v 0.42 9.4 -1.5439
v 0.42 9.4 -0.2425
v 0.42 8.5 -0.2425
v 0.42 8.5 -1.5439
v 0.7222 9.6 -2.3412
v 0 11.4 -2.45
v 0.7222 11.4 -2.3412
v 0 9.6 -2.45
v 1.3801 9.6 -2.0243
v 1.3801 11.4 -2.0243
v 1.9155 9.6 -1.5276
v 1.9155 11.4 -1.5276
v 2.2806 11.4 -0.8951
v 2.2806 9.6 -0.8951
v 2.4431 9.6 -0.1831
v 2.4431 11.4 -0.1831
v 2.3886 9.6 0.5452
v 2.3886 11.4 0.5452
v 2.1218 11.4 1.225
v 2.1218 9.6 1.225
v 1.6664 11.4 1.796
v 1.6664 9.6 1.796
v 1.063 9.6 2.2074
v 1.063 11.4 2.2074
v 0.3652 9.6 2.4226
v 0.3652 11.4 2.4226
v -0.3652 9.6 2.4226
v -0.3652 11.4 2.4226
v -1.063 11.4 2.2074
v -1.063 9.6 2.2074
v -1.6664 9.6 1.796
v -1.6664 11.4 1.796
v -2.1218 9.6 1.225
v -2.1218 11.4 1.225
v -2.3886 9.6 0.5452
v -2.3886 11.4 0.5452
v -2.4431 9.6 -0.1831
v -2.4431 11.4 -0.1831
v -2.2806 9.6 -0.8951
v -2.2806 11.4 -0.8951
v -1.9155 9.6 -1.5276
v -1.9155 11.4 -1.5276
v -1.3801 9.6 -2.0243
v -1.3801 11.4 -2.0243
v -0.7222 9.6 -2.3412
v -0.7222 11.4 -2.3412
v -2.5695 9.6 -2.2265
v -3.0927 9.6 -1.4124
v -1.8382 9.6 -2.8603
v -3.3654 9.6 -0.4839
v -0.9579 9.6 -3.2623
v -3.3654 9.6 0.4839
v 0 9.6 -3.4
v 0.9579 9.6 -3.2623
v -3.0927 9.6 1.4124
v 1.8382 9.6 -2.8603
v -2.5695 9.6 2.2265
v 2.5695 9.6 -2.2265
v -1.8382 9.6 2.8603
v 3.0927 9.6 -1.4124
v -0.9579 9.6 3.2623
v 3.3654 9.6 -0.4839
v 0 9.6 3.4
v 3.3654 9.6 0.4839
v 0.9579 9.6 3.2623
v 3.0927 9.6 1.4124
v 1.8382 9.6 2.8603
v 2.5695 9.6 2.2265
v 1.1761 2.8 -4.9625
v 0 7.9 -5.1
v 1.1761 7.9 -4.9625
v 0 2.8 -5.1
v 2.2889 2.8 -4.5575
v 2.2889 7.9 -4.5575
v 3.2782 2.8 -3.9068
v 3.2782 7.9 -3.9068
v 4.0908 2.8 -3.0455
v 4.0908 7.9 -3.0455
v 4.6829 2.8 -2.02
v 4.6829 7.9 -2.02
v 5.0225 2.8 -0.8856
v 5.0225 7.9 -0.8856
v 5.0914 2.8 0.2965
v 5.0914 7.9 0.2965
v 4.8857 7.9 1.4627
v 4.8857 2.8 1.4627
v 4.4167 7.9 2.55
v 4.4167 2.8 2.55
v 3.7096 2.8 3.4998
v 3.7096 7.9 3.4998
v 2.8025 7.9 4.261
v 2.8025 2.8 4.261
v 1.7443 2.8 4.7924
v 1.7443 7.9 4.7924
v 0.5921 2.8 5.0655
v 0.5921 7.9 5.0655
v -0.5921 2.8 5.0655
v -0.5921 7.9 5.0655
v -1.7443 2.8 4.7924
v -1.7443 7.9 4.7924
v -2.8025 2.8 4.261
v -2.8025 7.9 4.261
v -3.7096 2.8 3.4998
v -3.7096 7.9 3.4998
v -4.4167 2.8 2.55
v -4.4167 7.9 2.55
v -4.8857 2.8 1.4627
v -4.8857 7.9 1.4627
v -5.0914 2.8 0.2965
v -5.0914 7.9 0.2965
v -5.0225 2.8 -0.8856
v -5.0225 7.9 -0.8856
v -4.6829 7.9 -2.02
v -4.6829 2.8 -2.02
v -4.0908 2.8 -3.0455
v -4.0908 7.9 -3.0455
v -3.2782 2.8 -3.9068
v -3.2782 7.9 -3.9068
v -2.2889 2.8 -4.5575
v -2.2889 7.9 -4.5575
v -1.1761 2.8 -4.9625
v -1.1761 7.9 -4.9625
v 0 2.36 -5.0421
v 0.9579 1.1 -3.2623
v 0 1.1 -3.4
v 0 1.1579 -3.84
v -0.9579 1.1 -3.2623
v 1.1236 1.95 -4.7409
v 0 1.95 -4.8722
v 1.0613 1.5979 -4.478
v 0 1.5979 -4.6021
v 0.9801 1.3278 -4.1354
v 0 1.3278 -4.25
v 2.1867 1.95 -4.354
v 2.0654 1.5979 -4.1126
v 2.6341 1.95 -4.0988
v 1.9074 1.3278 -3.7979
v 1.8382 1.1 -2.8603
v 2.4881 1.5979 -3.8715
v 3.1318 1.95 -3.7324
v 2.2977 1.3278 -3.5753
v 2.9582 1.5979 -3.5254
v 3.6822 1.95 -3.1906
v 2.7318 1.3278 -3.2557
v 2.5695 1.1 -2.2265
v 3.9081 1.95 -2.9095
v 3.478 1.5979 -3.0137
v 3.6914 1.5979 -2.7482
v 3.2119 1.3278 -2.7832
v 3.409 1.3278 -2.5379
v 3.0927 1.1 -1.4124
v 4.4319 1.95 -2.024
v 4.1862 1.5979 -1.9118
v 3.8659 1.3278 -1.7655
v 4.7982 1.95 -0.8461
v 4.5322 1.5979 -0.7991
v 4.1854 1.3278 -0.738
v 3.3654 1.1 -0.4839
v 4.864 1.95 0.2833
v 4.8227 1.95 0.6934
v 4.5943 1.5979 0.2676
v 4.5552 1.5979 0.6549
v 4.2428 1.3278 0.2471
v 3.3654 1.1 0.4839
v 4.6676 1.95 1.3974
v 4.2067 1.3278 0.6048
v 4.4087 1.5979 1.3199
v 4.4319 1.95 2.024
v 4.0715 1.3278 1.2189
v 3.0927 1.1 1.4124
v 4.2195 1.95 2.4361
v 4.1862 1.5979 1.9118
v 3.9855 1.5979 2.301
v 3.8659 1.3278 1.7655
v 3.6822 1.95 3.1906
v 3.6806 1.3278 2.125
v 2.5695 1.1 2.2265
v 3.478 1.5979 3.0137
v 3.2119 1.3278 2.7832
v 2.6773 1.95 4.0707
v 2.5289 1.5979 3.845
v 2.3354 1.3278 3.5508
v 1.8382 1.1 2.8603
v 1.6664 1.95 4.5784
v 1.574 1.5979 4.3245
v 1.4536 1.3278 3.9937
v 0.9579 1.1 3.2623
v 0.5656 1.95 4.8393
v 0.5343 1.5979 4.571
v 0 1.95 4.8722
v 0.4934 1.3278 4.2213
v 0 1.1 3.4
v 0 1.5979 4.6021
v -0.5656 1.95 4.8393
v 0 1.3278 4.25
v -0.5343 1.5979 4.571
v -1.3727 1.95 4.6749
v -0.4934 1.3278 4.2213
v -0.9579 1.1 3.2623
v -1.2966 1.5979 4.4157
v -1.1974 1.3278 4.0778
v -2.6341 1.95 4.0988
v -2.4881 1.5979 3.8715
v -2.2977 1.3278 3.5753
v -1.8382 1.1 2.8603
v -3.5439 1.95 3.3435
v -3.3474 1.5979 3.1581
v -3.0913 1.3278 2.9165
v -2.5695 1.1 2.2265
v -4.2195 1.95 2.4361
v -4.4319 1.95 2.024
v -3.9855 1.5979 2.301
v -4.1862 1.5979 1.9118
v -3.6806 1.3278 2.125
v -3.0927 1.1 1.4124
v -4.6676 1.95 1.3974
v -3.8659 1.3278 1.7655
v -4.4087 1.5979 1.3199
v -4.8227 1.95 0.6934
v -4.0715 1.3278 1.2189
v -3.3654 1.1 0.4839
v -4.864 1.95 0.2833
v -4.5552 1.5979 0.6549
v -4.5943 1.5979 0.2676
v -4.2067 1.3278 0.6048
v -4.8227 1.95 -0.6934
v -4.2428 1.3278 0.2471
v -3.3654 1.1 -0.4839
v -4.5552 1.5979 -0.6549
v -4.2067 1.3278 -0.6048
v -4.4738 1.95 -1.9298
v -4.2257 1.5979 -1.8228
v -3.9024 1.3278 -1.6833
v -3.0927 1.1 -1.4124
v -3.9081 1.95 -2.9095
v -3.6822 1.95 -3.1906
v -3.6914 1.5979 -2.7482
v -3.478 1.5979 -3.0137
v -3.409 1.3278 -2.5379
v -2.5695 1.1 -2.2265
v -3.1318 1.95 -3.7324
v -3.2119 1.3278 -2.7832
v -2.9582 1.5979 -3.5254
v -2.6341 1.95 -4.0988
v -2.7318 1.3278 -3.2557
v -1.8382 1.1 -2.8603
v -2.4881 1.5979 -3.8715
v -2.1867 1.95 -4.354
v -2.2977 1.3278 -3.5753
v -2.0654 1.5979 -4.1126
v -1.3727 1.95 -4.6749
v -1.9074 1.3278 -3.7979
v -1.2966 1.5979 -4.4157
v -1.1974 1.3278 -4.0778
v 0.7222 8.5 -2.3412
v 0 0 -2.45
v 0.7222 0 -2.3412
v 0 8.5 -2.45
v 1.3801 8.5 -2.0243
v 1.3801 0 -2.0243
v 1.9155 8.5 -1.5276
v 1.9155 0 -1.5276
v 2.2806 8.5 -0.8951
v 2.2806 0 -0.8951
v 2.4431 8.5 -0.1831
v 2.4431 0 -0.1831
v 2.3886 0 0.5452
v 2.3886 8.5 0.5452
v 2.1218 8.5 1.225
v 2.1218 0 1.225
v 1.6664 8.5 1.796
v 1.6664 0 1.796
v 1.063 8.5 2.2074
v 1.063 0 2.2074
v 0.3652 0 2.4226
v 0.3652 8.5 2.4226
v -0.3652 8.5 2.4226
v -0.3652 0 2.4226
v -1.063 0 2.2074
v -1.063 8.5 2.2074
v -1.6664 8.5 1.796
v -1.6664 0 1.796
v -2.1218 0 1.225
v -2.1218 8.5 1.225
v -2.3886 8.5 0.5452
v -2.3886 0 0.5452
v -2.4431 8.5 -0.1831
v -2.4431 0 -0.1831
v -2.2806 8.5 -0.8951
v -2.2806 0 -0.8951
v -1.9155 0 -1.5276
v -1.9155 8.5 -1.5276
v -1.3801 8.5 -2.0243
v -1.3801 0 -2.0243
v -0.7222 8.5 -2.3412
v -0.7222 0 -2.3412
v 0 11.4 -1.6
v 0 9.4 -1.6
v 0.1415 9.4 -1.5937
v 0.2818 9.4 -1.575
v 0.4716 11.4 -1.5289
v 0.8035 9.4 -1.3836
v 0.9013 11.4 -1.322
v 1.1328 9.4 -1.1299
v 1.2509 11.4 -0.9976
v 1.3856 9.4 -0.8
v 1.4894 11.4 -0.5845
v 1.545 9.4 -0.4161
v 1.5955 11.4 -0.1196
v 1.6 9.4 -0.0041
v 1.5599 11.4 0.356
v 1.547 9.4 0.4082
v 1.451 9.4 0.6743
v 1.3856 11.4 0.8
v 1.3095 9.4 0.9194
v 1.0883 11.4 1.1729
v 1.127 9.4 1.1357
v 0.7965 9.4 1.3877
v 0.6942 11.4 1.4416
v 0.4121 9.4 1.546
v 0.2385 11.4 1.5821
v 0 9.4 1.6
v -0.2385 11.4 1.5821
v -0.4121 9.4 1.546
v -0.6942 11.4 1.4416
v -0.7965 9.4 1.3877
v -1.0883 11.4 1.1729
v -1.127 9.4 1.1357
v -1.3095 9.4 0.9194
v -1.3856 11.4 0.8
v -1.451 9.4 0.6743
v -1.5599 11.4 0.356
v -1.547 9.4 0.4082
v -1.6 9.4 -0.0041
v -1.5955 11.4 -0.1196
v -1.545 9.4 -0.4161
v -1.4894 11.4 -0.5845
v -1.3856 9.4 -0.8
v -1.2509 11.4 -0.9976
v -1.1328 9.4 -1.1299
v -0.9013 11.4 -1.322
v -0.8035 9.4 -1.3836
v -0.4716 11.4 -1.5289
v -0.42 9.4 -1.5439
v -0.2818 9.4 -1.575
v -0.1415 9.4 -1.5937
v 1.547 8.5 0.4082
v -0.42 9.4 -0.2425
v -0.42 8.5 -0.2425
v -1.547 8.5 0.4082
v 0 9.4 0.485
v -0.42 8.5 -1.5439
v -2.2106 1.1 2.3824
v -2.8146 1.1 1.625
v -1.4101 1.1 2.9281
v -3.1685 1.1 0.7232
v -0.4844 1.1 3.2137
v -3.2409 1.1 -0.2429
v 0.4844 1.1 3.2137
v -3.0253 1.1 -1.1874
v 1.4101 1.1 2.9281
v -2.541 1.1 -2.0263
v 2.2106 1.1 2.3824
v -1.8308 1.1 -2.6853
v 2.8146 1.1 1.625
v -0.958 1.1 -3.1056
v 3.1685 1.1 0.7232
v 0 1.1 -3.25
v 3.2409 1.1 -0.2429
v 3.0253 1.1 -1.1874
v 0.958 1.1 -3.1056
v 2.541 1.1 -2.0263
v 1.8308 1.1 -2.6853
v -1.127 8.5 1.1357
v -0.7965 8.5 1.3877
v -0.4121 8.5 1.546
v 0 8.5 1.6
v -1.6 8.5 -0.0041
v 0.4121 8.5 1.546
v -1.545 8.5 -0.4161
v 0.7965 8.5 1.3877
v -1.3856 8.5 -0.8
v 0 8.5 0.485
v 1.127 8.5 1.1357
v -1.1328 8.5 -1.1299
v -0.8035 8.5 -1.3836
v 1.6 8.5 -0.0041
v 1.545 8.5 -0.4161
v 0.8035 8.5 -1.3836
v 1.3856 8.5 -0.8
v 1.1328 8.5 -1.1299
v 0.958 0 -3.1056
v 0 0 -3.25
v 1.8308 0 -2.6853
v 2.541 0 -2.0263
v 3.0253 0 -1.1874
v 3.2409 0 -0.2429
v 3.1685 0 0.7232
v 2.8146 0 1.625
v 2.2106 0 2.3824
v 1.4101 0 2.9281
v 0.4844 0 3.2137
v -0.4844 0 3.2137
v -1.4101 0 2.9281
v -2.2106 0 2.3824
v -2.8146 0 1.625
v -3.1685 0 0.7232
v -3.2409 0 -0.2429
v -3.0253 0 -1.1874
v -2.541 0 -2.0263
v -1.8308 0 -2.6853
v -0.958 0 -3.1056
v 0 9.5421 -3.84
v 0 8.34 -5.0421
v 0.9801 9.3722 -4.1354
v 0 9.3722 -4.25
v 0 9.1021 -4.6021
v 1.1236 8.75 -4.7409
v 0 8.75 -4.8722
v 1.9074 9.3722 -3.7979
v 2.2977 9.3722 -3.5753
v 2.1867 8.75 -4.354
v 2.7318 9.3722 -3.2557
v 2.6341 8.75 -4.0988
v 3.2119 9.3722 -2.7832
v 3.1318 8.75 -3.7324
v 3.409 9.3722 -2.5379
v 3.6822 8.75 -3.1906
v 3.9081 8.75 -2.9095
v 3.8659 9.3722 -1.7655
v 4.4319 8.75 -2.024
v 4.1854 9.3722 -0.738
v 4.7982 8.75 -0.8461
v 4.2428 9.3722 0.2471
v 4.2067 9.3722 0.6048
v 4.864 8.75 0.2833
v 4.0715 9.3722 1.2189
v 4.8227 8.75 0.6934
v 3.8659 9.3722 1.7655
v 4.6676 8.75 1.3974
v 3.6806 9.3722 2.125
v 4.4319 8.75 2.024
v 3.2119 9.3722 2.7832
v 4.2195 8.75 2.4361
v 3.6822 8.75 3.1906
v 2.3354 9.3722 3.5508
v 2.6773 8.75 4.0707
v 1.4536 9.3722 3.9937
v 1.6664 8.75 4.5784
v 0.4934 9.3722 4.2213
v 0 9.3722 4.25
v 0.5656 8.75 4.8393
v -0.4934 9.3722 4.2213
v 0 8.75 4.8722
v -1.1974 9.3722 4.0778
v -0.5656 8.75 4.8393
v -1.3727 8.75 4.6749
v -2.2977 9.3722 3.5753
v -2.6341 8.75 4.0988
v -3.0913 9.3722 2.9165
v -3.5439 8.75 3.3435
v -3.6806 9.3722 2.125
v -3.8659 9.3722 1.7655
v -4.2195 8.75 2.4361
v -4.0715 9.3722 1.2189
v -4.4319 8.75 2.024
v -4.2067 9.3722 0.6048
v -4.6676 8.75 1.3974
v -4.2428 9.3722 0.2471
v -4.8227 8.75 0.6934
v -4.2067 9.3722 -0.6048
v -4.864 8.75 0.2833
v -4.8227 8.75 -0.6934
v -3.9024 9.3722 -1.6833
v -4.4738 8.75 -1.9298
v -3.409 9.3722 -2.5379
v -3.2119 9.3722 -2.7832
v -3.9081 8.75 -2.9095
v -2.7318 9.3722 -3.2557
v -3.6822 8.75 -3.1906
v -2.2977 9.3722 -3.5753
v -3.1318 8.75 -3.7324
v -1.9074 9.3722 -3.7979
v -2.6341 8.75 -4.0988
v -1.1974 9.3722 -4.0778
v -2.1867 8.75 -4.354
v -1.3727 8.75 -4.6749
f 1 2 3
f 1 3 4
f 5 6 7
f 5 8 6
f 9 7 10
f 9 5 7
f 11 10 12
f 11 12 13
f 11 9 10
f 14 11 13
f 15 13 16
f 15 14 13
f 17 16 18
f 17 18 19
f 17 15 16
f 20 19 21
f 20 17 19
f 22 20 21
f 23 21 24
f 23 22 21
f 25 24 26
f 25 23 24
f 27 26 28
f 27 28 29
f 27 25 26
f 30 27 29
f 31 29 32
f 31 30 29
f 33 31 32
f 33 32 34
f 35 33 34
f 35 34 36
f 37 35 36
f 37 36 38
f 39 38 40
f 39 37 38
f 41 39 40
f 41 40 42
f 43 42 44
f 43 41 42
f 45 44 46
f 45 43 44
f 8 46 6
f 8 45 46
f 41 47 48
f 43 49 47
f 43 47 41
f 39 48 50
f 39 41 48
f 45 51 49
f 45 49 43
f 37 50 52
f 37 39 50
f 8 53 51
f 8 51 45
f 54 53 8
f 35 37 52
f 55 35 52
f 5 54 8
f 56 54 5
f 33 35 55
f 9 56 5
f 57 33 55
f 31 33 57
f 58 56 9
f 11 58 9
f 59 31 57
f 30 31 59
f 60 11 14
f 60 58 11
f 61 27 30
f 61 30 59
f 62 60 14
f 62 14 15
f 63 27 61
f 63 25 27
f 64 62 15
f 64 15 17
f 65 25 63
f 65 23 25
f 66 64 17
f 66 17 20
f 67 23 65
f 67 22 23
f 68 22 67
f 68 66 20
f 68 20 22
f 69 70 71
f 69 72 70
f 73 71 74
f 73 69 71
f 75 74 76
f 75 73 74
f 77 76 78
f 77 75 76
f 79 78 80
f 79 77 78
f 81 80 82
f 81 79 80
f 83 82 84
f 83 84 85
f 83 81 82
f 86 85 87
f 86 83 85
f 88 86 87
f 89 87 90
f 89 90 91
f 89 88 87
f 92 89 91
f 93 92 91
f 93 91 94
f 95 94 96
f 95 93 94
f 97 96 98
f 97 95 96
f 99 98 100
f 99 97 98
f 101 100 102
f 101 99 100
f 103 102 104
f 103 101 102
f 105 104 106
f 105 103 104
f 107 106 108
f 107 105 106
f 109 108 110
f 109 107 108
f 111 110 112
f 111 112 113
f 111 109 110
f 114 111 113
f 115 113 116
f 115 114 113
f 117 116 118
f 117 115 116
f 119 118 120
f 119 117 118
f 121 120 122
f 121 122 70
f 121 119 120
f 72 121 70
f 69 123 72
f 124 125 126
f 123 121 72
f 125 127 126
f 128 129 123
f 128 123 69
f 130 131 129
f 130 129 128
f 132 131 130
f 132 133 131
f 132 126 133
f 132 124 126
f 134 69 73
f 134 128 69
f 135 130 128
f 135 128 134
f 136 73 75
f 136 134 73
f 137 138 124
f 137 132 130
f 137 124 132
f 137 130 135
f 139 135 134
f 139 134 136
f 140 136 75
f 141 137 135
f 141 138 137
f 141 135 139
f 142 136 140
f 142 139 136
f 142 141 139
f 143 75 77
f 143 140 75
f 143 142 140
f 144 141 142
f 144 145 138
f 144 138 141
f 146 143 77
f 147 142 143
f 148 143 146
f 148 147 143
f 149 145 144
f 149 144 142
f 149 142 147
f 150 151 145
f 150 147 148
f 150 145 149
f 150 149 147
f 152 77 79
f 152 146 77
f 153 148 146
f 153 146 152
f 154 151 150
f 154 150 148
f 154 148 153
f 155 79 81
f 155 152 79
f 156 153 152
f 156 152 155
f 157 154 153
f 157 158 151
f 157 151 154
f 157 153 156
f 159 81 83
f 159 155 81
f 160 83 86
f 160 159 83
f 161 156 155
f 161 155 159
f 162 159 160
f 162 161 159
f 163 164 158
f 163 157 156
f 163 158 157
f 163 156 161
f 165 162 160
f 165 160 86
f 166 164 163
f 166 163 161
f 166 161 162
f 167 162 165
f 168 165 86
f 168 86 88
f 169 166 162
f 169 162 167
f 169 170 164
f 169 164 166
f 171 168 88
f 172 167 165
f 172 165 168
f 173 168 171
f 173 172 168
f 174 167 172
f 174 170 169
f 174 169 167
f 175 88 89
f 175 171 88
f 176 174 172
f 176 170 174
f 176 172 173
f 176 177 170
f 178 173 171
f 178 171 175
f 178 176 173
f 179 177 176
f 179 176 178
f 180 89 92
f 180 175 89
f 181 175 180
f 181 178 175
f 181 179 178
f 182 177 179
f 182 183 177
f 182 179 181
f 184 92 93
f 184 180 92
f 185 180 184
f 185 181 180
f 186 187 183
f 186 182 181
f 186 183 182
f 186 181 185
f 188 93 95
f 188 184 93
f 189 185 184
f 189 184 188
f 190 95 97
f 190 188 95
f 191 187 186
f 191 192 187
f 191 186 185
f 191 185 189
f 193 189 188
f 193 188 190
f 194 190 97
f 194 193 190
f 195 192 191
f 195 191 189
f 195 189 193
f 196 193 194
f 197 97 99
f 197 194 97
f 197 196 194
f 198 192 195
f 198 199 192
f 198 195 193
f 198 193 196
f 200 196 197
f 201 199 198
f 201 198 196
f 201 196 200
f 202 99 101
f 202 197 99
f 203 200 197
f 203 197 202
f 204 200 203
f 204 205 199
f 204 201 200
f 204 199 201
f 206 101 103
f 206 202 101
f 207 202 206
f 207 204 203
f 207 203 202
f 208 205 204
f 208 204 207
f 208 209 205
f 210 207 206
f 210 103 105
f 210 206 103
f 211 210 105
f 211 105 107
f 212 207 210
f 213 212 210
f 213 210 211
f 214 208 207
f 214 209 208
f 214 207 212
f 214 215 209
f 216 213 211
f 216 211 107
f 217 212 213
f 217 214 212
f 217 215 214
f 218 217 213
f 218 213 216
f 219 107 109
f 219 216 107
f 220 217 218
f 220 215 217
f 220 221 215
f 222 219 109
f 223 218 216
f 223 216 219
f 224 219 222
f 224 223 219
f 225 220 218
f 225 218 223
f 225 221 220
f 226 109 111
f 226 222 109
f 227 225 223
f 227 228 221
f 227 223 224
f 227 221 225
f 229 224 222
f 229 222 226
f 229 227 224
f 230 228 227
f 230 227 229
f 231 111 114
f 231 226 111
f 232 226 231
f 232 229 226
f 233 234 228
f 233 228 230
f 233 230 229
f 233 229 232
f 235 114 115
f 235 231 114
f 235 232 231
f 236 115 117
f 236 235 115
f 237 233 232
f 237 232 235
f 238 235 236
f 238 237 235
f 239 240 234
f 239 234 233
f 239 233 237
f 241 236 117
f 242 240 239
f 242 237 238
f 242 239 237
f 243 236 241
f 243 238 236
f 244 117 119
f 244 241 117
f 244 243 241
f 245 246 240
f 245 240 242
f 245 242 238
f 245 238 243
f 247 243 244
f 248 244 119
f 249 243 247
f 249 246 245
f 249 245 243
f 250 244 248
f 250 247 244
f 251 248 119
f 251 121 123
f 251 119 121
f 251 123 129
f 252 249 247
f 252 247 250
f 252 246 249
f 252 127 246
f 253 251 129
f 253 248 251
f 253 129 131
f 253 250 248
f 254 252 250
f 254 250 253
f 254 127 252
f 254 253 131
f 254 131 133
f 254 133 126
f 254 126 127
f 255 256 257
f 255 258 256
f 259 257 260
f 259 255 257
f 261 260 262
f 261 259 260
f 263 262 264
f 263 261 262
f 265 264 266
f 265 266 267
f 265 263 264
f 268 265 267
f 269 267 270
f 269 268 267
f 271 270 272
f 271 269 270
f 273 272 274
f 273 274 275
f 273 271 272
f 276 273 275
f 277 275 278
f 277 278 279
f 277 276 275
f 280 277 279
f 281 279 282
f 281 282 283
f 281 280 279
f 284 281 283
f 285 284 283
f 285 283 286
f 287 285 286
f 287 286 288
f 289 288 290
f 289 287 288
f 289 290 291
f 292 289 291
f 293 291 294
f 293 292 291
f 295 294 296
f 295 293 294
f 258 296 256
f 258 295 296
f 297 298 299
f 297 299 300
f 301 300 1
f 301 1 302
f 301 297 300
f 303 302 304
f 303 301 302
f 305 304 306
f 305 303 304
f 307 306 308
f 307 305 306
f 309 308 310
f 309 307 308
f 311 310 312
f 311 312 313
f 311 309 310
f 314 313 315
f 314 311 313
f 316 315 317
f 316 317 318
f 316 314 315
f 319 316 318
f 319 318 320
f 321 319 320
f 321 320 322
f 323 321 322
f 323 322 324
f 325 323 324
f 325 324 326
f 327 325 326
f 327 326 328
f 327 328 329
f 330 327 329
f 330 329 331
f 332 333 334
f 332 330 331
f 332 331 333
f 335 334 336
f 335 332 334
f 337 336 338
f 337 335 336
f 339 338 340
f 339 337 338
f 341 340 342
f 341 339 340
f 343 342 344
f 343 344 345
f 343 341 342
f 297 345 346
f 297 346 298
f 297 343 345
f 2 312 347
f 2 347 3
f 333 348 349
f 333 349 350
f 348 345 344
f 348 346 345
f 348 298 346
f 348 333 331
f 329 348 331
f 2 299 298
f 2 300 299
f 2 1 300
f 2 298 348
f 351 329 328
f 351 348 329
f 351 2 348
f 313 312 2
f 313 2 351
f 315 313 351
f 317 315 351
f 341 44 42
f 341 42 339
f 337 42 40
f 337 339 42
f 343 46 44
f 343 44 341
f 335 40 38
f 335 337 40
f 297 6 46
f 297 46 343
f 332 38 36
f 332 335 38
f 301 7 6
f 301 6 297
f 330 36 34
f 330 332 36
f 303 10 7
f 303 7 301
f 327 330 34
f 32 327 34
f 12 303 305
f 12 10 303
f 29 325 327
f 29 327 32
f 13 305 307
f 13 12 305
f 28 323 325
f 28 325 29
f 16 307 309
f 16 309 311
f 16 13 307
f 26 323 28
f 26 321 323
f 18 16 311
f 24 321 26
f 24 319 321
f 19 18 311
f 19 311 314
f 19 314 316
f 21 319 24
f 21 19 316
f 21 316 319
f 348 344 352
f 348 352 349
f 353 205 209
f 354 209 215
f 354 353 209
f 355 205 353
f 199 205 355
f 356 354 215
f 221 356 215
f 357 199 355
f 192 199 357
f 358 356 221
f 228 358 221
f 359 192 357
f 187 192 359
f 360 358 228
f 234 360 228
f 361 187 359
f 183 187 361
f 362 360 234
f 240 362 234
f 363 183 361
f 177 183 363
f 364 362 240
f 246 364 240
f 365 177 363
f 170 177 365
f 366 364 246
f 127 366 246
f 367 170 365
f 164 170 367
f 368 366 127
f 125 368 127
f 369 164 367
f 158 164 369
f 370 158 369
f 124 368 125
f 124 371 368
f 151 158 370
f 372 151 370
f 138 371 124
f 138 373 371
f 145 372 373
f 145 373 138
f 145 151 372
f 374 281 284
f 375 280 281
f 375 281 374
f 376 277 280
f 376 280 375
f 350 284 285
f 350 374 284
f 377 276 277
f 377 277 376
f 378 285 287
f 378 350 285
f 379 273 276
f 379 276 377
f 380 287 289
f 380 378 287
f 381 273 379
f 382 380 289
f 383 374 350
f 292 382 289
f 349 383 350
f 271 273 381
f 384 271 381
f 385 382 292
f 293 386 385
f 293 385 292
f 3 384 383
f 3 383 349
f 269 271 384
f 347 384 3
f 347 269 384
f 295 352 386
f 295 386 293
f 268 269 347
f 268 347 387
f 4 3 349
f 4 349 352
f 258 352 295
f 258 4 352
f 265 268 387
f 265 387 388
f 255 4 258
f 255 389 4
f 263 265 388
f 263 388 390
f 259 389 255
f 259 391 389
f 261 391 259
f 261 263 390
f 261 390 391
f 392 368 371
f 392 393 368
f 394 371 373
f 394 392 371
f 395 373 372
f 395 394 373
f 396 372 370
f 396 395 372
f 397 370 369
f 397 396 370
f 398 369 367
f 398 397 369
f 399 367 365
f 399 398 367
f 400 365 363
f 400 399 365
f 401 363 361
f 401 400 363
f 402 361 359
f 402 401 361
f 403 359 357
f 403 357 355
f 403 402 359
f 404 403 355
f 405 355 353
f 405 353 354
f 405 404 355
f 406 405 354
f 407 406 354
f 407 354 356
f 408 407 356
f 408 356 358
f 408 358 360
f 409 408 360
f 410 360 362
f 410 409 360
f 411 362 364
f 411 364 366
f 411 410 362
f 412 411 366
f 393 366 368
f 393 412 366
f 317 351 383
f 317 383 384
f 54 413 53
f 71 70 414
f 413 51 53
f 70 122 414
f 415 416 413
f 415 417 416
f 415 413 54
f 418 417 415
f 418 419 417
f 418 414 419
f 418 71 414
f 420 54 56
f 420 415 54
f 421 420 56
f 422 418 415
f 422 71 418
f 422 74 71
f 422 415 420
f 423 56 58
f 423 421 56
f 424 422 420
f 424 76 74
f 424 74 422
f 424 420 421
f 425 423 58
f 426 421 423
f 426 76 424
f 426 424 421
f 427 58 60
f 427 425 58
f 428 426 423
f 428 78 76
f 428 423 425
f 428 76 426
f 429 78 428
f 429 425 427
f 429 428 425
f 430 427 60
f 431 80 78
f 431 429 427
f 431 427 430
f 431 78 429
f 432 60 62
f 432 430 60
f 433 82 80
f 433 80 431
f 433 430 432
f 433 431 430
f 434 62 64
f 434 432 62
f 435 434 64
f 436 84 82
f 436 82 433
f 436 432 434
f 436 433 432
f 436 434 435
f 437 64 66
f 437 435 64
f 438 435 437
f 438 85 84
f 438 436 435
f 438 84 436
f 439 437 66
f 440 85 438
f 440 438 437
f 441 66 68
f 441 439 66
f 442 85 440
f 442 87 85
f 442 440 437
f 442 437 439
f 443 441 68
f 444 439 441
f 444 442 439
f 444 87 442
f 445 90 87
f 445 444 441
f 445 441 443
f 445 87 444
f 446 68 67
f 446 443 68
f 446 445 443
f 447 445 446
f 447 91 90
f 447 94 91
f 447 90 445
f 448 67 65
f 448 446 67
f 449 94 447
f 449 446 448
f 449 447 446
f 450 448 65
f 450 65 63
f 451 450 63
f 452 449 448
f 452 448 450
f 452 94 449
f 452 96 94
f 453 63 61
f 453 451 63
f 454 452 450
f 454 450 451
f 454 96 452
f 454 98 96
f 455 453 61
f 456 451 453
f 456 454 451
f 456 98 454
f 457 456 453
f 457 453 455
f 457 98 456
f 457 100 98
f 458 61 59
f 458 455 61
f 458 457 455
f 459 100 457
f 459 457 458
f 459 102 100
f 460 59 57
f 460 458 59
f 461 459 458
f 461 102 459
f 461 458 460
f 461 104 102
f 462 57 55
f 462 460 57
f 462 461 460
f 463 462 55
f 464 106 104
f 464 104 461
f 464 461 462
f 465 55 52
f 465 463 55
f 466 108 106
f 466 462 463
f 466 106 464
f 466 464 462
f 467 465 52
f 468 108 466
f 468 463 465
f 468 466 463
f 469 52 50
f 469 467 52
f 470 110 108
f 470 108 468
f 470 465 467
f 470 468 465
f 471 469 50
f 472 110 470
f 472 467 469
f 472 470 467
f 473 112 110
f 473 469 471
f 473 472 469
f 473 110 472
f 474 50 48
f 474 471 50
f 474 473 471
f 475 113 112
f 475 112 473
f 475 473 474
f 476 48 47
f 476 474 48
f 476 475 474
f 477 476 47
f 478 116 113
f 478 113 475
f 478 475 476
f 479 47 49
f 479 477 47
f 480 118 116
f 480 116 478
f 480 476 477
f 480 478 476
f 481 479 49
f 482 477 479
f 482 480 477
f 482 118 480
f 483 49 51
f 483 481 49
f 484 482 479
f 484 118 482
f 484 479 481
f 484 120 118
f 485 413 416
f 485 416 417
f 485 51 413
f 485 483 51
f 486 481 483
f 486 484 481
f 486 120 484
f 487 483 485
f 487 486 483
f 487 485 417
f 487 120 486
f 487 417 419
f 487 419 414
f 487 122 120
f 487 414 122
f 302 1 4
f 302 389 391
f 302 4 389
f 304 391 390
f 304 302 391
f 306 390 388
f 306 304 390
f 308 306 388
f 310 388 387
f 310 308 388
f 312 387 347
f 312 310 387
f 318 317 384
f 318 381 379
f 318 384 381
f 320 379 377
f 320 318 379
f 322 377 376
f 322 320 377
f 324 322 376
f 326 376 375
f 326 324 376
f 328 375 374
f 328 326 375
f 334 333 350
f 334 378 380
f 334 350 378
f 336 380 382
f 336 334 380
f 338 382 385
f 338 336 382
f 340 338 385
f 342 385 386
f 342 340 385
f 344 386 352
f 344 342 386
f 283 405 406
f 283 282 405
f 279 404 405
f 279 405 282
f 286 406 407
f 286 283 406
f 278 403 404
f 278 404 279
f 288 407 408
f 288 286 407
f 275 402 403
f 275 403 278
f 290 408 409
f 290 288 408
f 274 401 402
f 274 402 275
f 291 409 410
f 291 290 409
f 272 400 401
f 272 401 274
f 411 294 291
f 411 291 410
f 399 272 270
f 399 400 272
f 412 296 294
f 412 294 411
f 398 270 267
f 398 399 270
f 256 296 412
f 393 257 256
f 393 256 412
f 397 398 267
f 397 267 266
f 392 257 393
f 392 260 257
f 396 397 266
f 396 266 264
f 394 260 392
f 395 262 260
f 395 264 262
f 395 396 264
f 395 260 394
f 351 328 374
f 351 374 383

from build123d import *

# Parameters (mm, degrees)
AIR_HOLE_DEPTH    = 10
CIRCPATTERN_COUNT = 3


with BuildPart() as part:
    # Sketch1 → Head Revolve (revolve)
    with BuildSketch(Plane(origin=(0, 0, 0), x_dir=(0, 0, -1), z_dir=(1, 0, 0))):
        with BuildLine():
            Line((0, 8.5), (0, 9.4))
            Line((0, 9.4), (1.6, 9.4))
            Line((1.6, 9.4), (1.6, 11.4))
            Line((1.6, 11.4), (2.45, 11.4))
            Line((2.45, 11.4), (2.45, 9.6))
            Line((2.45, 9.6), (3.4, 9.6))
            ThreePointArc((3.4, 9.6), (4.602081528, 9.102081528), (5.1, 7.9))
            Line((5.1, 7.9), (5.1, 2.8))
            ThreePointArc((5.1, 2.8), (4.602081528, 1.597918472), (3.4, 1.1))
            Line((3.4, 1.1), (3.25, 1.1))
            Line((3.25, 1.1), (3.25, 0))
            Line((3.25, 0), (2.45, 0))
            Line((2.45, 0), (2.45, 8.5))
            Line((2.45, 8.5), (0, 8.5))
        make_face()
    revolve(axis=Axis((0, 16.31372549, 0), (0, -1, 0)))

    # Sketch2 → Air Hole (cut)
    with BuildSketch(Plane(origin=(0, 9.4, 0), x_dir=(1, 0, 0), z_dir=(0, 1, 0))):
        with BuildLine():
            Line((-0.42, 1.543891188), (-0.42, 0.242487113))
            Line((-0.42, 0.242487113), (-1.547048989, -0.408214924))
            ThreePointArc((-1.547048989, -0.408214924), (-1.385640646, 0.8), (-0.42, 1.543891188))
        make_face()
    air_hole = extrude(amount=-AIR_HOLE_DEPTH, mode=Mode.SUBTRACT)

    # CircPattern: Air Hole ×3 about axis
    circpattern_axis = Axis((0, 0, 0), (0, 1, 0))
    for i in range(1, CIRCPATTERN_COUNT):
        add(air_hole.rotate(circpattern_axis, i * 360 / CIRCPATTERN_COUNT), mode=Mode.SUBTRACT)


solid = part.part
